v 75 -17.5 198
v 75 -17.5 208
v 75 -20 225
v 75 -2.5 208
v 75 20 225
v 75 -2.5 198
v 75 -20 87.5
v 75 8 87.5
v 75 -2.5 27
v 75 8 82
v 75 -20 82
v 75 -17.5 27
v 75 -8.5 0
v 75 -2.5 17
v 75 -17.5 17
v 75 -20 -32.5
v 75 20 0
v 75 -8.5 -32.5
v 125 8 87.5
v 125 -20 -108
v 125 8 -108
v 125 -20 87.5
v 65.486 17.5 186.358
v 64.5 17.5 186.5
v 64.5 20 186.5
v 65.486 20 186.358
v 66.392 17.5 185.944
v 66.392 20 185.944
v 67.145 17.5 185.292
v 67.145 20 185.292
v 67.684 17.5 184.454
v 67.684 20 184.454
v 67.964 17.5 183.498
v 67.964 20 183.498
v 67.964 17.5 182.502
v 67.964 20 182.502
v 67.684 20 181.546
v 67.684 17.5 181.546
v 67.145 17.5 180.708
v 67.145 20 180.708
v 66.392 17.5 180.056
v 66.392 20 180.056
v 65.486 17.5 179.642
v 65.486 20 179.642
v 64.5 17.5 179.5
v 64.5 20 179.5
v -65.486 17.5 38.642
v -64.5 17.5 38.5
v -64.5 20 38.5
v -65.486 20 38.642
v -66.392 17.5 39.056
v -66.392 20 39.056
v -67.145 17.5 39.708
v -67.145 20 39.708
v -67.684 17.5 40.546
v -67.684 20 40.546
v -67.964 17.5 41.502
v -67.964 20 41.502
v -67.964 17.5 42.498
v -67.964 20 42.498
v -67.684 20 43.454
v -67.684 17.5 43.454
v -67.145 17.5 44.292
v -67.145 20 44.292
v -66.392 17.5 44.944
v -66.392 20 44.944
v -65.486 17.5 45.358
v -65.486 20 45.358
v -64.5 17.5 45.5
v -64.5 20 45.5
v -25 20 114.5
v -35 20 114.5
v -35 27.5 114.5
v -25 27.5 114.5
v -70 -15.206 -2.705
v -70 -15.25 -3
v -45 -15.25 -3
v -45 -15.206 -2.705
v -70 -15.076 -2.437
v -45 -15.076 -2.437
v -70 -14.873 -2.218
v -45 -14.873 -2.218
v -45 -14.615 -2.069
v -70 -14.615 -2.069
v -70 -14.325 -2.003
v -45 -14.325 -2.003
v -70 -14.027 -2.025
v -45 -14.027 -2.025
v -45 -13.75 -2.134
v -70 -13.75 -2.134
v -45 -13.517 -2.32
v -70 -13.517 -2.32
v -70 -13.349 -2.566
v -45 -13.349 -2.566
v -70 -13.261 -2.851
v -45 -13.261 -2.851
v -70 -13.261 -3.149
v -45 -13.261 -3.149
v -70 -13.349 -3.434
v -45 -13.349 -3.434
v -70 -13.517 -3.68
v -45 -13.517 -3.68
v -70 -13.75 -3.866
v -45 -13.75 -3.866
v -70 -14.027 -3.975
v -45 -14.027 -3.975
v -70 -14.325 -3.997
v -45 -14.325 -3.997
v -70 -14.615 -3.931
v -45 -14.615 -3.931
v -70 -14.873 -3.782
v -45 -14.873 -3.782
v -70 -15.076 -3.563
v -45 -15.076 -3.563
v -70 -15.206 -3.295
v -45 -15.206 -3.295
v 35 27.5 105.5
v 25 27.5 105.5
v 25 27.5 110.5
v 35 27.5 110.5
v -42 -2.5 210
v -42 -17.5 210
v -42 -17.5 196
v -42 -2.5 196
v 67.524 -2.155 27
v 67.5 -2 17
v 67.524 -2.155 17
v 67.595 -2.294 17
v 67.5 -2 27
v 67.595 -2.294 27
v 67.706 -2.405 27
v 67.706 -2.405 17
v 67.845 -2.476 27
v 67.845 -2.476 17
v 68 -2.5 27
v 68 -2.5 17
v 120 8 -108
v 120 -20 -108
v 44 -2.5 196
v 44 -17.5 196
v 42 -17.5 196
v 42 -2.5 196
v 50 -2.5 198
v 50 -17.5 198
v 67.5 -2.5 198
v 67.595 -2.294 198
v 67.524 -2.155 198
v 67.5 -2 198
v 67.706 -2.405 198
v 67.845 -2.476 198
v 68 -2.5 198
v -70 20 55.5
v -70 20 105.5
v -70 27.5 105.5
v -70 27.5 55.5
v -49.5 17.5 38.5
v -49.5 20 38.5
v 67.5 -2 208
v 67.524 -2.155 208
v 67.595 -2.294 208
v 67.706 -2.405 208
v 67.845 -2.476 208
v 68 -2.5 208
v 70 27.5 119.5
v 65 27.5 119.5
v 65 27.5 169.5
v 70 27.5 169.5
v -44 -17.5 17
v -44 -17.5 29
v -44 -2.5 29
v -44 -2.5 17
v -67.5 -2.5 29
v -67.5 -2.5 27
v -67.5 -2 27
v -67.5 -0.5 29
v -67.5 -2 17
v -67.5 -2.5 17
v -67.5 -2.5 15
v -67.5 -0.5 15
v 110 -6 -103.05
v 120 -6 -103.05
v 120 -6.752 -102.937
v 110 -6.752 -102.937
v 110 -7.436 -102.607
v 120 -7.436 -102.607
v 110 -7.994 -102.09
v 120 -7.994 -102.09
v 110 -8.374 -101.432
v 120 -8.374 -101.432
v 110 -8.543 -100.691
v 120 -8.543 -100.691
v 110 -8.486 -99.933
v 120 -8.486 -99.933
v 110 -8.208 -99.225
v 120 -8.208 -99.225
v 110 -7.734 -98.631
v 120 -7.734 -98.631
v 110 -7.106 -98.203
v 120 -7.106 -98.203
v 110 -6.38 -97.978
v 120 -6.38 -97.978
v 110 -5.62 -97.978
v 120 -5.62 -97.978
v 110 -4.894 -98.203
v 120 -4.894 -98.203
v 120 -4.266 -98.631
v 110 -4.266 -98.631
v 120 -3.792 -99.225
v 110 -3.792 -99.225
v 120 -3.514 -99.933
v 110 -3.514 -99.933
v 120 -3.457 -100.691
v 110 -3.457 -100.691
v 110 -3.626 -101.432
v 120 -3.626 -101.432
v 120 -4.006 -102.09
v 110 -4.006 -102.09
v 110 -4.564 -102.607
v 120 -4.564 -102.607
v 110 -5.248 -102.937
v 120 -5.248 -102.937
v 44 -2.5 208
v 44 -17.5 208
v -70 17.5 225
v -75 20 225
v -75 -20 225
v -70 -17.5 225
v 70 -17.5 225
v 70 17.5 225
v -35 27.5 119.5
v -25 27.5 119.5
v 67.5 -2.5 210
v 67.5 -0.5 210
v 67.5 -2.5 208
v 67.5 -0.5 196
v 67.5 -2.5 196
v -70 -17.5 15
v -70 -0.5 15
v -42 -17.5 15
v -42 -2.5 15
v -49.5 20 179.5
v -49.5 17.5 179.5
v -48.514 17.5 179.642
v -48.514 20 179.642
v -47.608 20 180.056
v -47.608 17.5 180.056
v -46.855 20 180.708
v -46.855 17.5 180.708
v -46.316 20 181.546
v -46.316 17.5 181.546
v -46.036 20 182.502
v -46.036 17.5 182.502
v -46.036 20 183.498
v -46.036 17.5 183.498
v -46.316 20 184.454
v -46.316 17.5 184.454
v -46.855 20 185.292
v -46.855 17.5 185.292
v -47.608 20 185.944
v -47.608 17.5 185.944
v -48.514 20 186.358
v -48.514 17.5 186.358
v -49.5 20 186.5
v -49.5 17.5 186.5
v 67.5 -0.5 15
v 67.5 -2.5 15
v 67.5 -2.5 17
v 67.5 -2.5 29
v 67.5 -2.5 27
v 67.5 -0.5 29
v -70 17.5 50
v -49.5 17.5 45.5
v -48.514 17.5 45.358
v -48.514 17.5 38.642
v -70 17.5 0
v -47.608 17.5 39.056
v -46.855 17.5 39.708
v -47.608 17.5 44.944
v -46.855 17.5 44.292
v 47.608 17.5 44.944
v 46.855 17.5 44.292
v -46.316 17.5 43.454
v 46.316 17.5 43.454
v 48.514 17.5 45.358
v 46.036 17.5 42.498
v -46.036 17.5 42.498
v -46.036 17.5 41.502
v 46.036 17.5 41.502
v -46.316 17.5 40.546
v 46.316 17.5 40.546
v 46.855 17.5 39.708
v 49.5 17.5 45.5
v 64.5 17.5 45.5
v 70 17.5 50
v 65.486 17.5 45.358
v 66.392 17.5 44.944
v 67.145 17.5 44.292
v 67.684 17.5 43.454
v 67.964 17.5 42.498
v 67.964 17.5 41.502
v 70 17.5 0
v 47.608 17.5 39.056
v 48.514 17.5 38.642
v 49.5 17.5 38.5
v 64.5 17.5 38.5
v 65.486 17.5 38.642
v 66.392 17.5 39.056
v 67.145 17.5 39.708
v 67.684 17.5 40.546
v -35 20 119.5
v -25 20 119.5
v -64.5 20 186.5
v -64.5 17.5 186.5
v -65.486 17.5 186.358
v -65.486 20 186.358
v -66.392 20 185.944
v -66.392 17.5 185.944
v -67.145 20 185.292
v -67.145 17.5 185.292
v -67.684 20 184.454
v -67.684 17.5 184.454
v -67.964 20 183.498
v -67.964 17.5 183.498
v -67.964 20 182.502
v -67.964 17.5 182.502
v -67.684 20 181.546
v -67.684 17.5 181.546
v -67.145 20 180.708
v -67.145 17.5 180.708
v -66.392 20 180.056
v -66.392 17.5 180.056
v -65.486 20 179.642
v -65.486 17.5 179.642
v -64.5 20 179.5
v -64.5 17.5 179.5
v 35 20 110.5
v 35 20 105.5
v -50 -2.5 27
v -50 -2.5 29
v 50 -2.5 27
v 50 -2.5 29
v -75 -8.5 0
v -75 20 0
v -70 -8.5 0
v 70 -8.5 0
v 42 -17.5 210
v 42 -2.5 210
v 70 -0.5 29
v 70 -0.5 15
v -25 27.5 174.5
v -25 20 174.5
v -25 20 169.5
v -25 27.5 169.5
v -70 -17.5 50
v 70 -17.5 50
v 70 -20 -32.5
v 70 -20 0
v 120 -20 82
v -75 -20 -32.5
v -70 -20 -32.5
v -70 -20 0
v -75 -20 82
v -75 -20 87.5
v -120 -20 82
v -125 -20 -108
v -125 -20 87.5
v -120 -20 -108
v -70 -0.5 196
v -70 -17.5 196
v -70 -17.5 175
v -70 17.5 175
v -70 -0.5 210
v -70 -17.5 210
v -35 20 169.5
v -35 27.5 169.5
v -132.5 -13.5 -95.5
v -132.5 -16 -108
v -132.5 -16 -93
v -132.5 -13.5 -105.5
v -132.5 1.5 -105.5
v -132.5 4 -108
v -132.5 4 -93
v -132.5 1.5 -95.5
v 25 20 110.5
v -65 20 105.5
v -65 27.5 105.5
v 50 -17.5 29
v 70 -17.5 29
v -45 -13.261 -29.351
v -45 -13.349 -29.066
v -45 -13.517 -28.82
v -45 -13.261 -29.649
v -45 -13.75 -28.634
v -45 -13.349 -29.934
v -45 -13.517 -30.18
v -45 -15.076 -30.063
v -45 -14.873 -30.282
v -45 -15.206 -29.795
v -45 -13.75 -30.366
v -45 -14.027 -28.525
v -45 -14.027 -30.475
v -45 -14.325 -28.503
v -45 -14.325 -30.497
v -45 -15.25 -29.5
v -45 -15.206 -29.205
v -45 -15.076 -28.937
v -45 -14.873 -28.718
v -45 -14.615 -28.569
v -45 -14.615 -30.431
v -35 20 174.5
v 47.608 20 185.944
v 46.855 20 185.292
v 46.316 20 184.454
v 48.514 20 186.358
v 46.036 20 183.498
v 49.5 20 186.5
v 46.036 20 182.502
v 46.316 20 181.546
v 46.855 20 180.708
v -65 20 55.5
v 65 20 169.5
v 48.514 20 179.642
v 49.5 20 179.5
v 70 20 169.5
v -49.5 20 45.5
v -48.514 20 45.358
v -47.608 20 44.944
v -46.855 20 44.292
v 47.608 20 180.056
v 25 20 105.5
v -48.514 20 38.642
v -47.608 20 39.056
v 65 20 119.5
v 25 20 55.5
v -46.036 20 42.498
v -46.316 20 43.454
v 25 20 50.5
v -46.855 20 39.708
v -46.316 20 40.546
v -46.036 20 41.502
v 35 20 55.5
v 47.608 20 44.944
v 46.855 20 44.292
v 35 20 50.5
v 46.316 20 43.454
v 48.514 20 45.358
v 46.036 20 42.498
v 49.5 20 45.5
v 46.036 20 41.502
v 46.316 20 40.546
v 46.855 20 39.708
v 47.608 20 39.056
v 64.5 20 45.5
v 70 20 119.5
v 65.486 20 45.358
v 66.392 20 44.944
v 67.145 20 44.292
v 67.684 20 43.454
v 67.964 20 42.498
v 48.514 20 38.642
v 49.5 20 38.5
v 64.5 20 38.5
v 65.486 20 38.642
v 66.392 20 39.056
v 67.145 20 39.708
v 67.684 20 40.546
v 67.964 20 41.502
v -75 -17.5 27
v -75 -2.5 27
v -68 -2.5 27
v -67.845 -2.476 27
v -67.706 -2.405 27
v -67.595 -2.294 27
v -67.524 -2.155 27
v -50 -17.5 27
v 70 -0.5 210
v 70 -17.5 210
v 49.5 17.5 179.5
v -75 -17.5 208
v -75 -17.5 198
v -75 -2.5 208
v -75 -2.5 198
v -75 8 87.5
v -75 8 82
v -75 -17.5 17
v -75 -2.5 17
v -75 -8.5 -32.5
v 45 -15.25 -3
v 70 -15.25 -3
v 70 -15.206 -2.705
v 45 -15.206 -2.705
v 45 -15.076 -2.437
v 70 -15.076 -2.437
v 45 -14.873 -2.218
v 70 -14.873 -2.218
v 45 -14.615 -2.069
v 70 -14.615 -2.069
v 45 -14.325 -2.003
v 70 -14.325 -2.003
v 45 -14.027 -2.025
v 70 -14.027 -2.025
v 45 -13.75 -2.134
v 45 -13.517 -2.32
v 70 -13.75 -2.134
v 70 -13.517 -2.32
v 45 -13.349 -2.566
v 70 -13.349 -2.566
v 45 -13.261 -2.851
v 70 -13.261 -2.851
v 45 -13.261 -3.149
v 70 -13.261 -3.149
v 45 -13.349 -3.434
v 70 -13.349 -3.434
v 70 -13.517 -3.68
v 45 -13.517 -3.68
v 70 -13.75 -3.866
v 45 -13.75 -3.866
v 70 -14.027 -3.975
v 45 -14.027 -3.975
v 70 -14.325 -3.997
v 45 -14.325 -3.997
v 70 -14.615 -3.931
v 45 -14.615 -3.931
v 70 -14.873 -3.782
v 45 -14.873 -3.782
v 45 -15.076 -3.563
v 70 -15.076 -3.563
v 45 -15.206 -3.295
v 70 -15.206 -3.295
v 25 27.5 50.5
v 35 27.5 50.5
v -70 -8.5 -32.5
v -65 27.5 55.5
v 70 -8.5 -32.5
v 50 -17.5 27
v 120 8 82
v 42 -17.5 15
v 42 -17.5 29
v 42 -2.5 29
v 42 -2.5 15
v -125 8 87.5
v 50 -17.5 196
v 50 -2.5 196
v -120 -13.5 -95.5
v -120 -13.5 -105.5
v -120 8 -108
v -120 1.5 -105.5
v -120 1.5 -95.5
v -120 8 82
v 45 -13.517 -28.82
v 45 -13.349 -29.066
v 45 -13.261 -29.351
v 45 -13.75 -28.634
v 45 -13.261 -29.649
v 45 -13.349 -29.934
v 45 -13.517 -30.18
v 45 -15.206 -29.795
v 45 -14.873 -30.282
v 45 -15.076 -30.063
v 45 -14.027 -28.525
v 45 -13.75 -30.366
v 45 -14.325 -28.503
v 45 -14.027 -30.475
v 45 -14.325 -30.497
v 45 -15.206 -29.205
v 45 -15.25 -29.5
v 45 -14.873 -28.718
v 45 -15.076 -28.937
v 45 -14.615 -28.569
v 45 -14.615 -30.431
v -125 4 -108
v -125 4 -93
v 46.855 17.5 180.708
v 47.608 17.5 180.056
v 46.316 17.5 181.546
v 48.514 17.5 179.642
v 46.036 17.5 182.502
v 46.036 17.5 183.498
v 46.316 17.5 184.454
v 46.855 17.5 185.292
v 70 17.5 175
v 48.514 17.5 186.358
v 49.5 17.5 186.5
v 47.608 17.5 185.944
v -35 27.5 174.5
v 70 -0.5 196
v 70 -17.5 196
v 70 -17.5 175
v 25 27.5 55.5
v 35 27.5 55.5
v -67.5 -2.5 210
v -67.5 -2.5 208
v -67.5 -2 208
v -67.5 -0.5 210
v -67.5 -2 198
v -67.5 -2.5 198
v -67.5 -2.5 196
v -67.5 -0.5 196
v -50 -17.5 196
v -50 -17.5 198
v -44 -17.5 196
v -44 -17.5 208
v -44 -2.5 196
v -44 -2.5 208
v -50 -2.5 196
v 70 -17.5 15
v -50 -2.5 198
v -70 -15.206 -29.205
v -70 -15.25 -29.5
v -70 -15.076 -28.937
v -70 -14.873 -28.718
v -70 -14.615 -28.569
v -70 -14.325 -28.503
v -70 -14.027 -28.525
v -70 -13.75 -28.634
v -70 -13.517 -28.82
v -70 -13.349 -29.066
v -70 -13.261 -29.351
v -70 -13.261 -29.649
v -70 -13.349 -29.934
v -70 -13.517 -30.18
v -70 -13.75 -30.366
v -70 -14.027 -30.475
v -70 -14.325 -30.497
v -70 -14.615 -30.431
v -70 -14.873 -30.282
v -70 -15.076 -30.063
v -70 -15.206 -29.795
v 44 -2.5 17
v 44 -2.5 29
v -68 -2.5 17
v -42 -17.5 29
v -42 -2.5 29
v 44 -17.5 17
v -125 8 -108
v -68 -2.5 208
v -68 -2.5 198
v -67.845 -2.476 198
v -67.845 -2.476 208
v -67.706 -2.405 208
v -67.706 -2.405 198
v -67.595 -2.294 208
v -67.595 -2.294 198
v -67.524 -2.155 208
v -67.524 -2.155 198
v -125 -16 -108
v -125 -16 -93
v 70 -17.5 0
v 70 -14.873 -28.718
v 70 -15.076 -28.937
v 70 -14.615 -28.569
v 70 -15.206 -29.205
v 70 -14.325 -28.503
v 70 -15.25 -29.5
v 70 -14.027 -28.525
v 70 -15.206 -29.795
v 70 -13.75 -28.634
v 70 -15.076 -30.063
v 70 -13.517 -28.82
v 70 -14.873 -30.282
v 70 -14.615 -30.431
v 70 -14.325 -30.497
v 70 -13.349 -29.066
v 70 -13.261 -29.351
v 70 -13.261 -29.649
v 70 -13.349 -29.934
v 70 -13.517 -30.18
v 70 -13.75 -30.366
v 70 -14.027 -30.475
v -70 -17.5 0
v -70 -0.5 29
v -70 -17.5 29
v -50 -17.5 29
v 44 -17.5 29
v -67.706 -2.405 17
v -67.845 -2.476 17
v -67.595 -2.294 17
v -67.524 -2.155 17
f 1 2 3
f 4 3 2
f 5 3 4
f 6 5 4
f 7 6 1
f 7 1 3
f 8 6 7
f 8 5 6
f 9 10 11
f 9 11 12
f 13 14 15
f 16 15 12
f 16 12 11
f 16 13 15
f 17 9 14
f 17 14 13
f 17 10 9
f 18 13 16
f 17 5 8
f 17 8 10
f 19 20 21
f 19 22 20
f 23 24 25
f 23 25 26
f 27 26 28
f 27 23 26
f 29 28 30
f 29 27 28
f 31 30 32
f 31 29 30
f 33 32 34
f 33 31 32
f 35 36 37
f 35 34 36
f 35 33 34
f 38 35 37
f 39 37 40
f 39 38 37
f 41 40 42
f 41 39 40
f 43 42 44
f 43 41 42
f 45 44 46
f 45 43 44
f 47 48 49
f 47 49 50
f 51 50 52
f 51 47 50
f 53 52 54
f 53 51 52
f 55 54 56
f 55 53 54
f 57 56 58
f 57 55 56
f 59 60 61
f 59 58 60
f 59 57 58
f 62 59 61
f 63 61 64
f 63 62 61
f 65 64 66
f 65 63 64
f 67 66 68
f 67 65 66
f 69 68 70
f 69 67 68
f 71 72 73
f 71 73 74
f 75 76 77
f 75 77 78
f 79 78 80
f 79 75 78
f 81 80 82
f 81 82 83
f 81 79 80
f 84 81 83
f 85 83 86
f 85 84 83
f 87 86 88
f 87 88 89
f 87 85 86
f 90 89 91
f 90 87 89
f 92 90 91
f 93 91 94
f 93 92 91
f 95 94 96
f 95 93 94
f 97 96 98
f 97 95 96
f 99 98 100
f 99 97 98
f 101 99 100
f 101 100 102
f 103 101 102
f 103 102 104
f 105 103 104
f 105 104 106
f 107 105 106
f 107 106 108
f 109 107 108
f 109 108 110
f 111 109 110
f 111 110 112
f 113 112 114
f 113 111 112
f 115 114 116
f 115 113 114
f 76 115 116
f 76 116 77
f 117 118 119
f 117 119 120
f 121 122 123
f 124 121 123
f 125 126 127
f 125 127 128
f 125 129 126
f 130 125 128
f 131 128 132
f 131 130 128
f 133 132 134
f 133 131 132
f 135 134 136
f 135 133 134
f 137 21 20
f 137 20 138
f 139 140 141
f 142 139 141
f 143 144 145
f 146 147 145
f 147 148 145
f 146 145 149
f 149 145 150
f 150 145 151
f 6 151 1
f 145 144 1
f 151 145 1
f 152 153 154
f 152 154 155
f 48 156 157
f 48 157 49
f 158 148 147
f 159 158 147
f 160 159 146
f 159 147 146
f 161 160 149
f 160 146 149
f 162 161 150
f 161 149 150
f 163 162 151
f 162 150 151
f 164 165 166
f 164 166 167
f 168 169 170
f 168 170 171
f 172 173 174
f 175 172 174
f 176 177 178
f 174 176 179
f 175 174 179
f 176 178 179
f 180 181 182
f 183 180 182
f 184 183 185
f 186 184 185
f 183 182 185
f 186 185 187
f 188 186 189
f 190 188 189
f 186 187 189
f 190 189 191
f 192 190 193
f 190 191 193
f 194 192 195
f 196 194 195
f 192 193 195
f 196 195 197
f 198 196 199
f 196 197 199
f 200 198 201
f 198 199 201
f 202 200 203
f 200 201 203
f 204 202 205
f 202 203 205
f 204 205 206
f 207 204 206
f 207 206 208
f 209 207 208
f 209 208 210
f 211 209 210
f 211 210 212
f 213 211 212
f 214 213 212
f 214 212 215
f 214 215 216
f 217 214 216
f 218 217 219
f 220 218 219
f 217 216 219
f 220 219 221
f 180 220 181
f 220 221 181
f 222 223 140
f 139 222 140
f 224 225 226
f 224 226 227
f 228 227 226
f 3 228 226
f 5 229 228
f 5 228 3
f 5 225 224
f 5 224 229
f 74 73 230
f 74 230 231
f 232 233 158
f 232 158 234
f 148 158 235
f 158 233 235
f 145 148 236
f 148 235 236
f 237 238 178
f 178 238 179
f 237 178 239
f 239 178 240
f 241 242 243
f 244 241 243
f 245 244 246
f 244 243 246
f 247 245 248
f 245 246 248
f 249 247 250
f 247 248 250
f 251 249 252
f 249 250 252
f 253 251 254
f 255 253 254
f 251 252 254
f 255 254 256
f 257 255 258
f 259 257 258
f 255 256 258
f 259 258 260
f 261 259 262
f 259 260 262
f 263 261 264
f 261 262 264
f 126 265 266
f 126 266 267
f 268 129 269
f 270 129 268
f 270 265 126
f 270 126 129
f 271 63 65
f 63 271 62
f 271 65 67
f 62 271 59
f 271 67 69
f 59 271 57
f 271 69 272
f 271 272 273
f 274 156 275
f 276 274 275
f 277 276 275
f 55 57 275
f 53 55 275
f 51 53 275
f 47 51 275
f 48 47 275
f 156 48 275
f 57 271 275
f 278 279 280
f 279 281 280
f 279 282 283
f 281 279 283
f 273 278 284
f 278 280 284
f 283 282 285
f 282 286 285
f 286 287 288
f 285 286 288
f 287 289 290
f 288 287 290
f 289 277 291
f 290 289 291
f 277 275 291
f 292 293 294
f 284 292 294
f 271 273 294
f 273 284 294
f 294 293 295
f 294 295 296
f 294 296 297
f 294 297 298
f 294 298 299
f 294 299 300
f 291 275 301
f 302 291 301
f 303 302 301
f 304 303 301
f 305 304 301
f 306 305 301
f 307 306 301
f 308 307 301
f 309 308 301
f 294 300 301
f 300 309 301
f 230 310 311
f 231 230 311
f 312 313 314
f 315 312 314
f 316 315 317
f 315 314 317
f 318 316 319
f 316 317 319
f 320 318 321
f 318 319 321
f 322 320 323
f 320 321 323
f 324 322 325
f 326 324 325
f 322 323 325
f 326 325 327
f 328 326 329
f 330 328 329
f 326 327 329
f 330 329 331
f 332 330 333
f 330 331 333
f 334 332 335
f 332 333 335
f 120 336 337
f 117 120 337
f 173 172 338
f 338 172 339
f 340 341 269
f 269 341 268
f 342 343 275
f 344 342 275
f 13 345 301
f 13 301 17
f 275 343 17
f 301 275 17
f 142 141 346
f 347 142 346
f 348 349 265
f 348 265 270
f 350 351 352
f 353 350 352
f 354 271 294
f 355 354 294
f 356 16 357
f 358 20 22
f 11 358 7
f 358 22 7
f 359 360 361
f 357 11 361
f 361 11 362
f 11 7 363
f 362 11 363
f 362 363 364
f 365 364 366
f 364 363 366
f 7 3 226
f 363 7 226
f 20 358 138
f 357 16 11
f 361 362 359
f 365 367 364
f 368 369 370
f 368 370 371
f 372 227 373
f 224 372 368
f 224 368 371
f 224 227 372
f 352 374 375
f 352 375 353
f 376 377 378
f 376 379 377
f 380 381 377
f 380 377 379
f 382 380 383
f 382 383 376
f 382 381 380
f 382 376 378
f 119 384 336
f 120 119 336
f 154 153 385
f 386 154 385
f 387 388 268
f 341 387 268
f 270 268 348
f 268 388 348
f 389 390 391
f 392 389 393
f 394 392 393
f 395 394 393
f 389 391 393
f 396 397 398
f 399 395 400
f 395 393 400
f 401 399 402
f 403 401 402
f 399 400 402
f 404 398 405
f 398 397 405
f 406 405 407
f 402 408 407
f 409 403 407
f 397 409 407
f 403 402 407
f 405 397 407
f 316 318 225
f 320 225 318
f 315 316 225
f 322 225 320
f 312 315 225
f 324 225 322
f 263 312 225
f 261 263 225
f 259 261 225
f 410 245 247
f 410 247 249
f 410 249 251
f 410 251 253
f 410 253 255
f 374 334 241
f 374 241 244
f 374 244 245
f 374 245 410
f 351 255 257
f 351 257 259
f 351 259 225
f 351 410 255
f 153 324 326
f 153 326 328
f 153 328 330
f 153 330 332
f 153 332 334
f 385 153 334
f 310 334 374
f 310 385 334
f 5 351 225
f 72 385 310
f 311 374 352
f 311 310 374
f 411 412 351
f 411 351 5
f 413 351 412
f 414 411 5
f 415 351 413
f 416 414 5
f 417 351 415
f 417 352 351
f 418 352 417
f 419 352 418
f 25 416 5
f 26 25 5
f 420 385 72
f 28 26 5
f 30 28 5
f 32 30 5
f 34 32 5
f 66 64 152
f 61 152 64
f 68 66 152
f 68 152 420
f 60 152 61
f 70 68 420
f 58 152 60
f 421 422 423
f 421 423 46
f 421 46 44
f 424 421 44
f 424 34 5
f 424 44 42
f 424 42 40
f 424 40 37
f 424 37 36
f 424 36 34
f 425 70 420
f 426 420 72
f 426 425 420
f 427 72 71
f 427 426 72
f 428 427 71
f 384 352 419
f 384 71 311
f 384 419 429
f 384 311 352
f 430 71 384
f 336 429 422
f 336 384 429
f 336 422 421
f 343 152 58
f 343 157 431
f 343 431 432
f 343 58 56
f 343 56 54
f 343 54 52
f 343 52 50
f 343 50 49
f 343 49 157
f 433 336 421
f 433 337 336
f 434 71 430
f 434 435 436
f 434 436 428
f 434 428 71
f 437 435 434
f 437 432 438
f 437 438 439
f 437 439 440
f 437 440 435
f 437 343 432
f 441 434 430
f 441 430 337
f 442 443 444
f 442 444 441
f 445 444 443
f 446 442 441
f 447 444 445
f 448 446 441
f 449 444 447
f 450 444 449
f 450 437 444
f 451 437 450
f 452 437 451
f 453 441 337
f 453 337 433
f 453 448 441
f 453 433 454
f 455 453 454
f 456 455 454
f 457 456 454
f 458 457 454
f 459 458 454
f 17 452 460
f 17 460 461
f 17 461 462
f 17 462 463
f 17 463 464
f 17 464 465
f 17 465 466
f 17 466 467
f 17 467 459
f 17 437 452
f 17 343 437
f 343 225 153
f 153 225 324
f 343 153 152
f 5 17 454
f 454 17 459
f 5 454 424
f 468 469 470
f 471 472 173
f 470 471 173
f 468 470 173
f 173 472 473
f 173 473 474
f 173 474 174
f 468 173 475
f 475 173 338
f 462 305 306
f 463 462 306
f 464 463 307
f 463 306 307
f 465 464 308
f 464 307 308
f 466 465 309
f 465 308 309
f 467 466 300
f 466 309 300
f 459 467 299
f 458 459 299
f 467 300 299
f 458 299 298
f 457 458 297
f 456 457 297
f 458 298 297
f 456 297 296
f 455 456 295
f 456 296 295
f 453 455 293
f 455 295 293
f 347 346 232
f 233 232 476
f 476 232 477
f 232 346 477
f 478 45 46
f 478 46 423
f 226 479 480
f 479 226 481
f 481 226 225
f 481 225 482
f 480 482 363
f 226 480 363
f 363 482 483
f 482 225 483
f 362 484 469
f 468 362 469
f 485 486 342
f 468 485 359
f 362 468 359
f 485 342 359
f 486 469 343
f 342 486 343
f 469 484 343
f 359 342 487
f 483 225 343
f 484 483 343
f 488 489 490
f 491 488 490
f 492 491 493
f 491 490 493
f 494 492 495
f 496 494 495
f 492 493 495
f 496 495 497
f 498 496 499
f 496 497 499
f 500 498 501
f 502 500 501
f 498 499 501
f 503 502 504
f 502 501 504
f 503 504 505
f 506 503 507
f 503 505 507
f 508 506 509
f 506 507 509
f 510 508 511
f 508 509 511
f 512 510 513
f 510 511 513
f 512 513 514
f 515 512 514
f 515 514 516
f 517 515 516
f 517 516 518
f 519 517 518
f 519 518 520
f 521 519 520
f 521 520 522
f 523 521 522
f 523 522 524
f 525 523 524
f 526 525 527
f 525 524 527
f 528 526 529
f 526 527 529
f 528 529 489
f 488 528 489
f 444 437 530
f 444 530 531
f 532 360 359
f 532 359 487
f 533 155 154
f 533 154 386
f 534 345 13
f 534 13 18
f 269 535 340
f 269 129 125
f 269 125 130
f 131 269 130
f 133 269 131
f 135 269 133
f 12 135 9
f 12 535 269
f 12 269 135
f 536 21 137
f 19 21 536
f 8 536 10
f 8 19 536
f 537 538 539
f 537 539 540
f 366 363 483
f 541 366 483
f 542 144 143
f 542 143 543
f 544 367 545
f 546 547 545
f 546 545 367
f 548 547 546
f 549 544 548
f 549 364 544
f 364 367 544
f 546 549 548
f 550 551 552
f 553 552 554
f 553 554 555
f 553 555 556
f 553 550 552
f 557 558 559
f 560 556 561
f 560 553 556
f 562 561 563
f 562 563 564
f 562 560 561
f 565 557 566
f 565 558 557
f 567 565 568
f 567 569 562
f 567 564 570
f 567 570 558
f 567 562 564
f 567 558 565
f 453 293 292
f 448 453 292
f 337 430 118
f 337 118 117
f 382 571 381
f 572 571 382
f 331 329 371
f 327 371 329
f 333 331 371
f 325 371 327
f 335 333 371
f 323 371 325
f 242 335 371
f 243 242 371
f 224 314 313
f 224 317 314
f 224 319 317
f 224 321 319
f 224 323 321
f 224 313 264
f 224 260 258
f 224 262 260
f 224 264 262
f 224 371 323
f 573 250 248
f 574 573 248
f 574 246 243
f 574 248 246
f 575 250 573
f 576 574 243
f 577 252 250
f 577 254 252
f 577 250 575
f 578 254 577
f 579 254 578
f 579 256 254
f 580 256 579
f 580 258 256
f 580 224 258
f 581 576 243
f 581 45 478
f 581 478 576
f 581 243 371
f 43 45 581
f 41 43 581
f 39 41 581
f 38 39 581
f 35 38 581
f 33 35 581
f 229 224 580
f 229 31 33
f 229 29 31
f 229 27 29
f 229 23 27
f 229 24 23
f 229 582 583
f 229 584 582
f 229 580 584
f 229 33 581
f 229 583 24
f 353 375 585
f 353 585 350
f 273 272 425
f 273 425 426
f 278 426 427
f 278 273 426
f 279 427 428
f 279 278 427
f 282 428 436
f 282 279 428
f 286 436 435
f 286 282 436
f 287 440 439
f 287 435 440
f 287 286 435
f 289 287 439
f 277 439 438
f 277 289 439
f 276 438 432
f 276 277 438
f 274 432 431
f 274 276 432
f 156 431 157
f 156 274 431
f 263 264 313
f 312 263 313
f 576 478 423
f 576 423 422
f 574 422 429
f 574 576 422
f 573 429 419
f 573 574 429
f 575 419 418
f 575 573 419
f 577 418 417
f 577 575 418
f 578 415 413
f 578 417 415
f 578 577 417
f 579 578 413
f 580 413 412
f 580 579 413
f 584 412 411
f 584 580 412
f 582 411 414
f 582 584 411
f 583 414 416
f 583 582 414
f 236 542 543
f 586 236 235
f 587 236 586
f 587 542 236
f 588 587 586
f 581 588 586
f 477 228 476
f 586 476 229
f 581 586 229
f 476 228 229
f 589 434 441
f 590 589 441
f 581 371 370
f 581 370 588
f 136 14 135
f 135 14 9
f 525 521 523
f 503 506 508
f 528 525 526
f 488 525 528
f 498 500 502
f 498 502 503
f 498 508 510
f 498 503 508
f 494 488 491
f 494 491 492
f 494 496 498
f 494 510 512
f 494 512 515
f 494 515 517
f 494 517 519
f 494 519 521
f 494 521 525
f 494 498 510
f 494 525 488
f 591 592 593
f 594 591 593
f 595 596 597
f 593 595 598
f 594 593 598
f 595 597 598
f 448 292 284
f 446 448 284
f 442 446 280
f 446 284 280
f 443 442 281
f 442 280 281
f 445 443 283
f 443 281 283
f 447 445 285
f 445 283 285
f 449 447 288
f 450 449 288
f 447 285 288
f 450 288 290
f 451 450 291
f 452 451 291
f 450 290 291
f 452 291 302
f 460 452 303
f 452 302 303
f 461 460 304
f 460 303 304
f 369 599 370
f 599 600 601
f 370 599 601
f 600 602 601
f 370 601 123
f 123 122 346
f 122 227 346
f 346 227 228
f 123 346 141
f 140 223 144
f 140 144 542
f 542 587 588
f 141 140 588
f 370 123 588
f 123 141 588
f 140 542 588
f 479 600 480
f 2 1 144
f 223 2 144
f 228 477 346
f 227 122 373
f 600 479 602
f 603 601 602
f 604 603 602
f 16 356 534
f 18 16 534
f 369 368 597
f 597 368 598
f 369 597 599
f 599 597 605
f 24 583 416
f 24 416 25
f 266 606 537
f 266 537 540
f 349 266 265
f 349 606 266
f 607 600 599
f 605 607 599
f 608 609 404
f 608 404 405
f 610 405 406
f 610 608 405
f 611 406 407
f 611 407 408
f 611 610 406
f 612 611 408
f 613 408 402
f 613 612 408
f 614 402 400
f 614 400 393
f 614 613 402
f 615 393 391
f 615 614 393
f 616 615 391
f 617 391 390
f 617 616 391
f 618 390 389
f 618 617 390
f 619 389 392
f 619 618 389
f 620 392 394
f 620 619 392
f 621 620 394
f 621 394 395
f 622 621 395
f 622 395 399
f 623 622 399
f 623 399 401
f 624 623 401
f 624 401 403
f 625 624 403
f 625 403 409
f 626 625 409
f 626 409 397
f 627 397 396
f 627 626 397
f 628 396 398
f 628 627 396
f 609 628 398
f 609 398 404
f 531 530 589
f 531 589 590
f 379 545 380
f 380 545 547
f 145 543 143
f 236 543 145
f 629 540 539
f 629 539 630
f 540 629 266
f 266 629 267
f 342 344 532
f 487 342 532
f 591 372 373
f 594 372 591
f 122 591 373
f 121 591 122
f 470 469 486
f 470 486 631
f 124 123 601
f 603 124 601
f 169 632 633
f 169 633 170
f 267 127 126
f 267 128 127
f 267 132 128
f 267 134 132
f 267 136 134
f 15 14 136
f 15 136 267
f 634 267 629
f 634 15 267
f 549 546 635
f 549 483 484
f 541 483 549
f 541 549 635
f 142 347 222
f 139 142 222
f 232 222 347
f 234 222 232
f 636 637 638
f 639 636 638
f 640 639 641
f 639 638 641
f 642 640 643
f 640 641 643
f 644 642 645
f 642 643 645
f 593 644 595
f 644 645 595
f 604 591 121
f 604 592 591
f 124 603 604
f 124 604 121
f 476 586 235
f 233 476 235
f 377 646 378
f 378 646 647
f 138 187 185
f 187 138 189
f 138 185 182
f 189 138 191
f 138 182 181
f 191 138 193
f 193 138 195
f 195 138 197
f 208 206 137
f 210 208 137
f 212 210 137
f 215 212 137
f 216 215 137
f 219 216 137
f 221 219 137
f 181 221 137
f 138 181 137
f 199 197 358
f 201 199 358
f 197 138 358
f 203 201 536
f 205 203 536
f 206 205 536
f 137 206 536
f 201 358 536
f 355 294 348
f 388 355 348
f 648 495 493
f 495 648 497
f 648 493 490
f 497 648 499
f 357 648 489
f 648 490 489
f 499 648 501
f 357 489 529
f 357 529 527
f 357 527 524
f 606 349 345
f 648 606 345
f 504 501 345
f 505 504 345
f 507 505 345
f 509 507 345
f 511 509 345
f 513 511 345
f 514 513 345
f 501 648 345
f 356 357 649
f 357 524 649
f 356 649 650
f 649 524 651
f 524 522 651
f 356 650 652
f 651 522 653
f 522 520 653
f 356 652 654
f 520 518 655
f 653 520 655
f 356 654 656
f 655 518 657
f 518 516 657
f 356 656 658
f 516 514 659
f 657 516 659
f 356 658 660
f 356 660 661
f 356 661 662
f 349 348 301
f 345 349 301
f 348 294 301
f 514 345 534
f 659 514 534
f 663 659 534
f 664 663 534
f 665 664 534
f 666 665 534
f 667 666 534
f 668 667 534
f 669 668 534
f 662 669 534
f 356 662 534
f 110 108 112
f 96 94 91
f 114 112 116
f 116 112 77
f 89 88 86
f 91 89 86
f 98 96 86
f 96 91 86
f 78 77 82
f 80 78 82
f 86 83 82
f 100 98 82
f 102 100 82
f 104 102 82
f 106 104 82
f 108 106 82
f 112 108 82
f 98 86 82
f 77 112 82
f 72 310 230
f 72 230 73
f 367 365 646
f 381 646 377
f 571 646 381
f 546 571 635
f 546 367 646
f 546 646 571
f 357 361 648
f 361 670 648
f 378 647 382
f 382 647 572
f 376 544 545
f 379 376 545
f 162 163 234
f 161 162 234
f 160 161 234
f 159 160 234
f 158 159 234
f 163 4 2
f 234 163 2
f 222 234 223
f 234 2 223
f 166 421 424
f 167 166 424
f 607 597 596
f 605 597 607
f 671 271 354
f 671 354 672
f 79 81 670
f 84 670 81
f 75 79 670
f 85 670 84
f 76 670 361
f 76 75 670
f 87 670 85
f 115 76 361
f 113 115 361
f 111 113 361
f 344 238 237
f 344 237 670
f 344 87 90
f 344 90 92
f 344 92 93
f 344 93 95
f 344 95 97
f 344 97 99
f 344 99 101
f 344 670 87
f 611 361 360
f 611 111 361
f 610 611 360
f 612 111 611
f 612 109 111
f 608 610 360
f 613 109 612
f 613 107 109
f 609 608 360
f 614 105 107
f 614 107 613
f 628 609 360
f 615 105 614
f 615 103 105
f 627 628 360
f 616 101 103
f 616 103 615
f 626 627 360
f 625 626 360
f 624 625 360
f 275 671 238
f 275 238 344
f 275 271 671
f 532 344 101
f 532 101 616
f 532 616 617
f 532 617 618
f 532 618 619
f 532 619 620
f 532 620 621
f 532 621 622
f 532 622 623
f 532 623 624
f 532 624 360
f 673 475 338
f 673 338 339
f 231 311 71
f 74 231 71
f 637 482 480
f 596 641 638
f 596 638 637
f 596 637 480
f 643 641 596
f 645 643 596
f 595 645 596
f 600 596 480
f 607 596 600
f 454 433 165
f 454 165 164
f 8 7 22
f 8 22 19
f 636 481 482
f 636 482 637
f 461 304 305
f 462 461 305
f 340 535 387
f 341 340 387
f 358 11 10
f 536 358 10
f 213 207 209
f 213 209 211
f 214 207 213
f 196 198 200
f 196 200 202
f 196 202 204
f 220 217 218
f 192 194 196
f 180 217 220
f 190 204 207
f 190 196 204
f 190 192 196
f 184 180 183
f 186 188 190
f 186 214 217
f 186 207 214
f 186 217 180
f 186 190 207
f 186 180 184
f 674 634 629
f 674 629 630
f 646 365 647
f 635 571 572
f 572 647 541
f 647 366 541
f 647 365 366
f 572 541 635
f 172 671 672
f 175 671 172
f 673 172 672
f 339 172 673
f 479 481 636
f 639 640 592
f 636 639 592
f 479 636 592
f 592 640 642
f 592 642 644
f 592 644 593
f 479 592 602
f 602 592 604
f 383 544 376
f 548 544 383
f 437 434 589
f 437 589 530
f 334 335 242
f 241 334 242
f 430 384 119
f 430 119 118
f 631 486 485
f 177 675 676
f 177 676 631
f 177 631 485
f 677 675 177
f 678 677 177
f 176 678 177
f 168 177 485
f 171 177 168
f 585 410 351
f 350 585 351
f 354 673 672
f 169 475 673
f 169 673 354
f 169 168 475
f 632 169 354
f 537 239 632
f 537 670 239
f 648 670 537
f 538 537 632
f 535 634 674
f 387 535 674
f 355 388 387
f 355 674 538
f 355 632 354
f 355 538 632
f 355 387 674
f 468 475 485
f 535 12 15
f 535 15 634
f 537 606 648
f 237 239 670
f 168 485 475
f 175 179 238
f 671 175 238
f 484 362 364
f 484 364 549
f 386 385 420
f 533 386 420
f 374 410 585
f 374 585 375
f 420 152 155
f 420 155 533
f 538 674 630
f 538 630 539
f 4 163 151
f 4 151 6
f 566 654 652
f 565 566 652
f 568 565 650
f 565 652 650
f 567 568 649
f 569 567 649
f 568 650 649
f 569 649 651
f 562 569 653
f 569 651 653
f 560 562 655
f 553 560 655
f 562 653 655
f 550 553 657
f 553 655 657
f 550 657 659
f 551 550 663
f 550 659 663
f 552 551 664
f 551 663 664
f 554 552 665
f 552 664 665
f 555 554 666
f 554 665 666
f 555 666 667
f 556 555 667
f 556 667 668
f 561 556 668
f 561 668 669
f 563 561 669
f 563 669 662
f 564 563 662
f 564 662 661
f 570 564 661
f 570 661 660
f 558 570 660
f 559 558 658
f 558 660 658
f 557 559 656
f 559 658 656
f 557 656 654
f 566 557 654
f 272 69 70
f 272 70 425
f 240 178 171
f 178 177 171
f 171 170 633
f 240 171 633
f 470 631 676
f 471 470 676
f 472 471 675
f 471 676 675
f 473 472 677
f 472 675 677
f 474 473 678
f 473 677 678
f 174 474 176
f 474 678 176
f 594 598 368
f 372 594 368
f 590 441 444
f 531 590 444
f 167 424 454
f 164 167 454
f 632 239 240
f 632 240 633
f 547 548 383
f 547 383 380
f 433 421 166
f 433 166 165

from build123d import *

# Parameters (mm, degrees)
SKETCH2_W            = 150
SKETCH2_H            = 40
BOSS_EXTRUDE1_DEPTH  = 225
SKETCH3_W            = 140
SKETCH3_H            = 35
CUT_EXTRUDE1_DEPTH   = 50
SKETCH4_W            = 26
SKETCH4_H            = 2
SKETCH4_W_2          = 20
BOSS_EXTRUDE2_DEPTH  = 15
SKETCH6_W            = 10
SKETCH6_H            = 15
CUT_EXTRUDE2_DEPTH   = 15
CUT_EXTRUDE3_DEPTH   = 67
SKETCH9_W            = 10
SKETCH9_H            = 15
CUT_EXTRUDE4_DEPTH   = 67
SKETCH12_W           = 14
SKETCH12_H           = 2
BOSS_EXTRUDE3_DEPTH  = 2.5
FILLET1_R            = 0.5
MIRROR3_START        = 196
MIRROR3_DEPTH        = 14
MIRROR3_START_2      = 15
MIRROR3_2_DEPTH      = 14
MIRROR3_3_DEPTH      = 2
MIRROR3_START_3      = 208
MIRROR3_4_DEPTH      = 2
MIRROR3_5_DEPTH      = 2
MIRROR3_START_4      = 27
MIRROR3_6_DEPTH      = 2
SKETCH16_W           = 32.5
SKETCH16_H           = 11.5
BOSS_EXTRUDE5_DEPTH  = 5
SKETCH17_R           = 1
BOSS_EXTRUDE7_DEPTH  = 25
SKETCH18_W           = 5
SKETCH18_H           = 50
SKETCH18_W_2         = 10
SKETCH18_H_2         = 5
BOSS_EXTRUDE8_DEPTH  = 7.5
SKETCH24_W           = 5.5
SKETCH24_H           = 28
BOSS_EXTRUDE11_DEPTH = 50
SKETCH25_W           = 5
SKETCH25_H           = 28
BOSS_EXTRUDE12_DEPTH = 190
SKETCH26_W           = 5
SKETCH26_H           = 28
BOSS_EXTRUDE13_DEPTH = 190
SKETCH27_R           = 2.55
BOSS_EXTRUDE14_DEPTH = 10
SKETCH29_W           = 10
SKETCH29_H           = 15
CUT_EXTRUDE5_DEPTH   = 19
SKETCH30_W           = 15
SKETCH30_H           = 20
BOSS_EXTRUDE15_DEPTH = 7.5
SKETCH32_W           = 10
SKETCH32_H           = 15
CUT_EXTRUDE6_DEPTH   = 19


# Read off the part's stored shape, not the designer's step: Mirror3
with BuildPart() as part:
    # Sketch2 → Boss-Extrude1 (new body)
    with BuildSketch(Plane.XY):
        Rectangle(SKETCH2_W, SKETCH2_H)
    extrude(amount=BOSS_EXTRUDE1_DEPTH)

    # Sketch3 → Cut-Extrude1 (cut)
    with BuildSketch(Plane.XY.offset(225)):
        Rectangle(SKETCH3_W, SKETCH3_H)
    cut_extrude1 = extrude(amount=-CUT_EXTRUDE1_DEPTH, mode=Mode.SUBTRACT)

    # Sketch4 → Boss-Extrude2 (add)
    with BuildSketch(Plane(origin=(0, -17.5, 0), x_dir=(1, 0, 0), z_dir=(0, 1, 0))):
        Polygon((-42, -196), (-44, -196), (-44, -208), (-44, -210), (-42, -210), align=None)
        with Locations((-57, -209)):
            Rectangle(SKETCH4_W, SKETCH4_H)
        with Locations((-60, -197)):
            Rectangle(SKETCH4_W_2, SKETCH4_H)
        Polygon((70, -210), (70, -208), (44, -208), (44, -196), (42, -196), (42, -210), (44, -210), align=None)
        with Locations((60, -197)):
            Rectangle(SKETCH4_W_2, SKETCH4_H)
    boss_extrude2 = extrude(amount=BOSS_EXTRUDE2_DEPTH)

    # Sketch6 → Cut-Extrude2 (cut)
    with BuildSketch(Plane(origin=(-70, 0, 0), x_dir=(0, 0, -1), z_dir=(1, 0, 0))):
        with Locations((-203, -10)):
            Rectangle(SKETCH6_W, SKETCH6_H)
    cut_extrude2 = extrude(amount=-CUT_EXTRUDE2_DEPTH, mode=Mode.SUBTRACT)

    # Sketch8 → Cut-Extrude3 (cut)
    with BuildSketch(Plane(origin=(0, -17.5, 0), x_dir=(1, 0, 0), z_dir=(0, 1, 0))):
        with BuildLine():
            Line((-64.5, -179.5), (-49.5, -179.5))
            ThreePointArc((-49.5, -179.5), (-46, -183), (-49.5, -186.5))
            Line((-49.5, -186.5), (-64.5, -186.5))
            ThreePointArc((-64.5, -186.5), (-68, -183), (-64.5, -179.5))
        make_face()
        with BuildLine():
            Line((64.5, -179.5), (49.5, -179.5))
            ThreePointArc((49.5, -179.5), (46, -183), (49.5, -186.5))
            Line((49.5, -186.5), (64.5, -186.5))
            ThreePointArc((64.5, -186.5), (68, -183), (64.5, -179.5))
        make_face()
    cut_extrude3 = extrude(amount=CUT_EXTRUDE3_DEPTH, mode=Mode.SUBTRACT)

    # Sketch9 → Cut-Extrude4 (cut)
    with BuildSketch(Plane.ZY.offset(-70)):
        with Locations((203, -10)):
            Rectangle(SKETCH9_W, SKETCH9_H)
    cut_extrude4 = extrude(amount=-CUT_EXTRUDE4_DEPTH, mode=Mode.SUBTRACT)

    # Mirror1: Cut-Extrude1, Boss-Extrude2, Cut-Extrude2, Cut-Extrude3, Cut-Extrude4 across plane
    add(cut_extrude1.mirror(Plane.XY.offset(112.5)), mode=Mode.SUBTRACT)
    add(boss_extrude2.mirror(Plane.XY.offset(112.5)))
    add(cut_extrude2.mirror(Plane.XY.offset(112.5)), mode=Mode.SUBTRACT)
    add(cut_extrude3.mirror(Plane.XY.offset(112.5)), mode=Mode.SUBTRACT)
    add(cut_extrude4.mirror(Plane.XY.offset(112.5)), mode=Mode.SUBTRACT)

    # Sketch12 → Boss-Extrude3 (add)
    with BuildSketch(Plane.ZY.offset(-70)):
        with Locations((22, -1.5)):
            Rectangle(SKETCH12_W, SKETCH12_H)
    extrude(amount=BOSS_EXTRUDE3_DEPTH)

    # Fillet1
    fillet1_edges = [part.edges().sort_by_distance(p)[0] for p in [
        (67.5, -2.5, 22),
    ]]
    fillet(fillet1_edges, radius=FILLET1_R)

    # Mirror3 outline → Mirror3 (add)
    with BuildSketch(Plane.XY.offset(MIRROR3_START)):
        with BuildLine():
            Line((-70, -2.5), (-68, -2.5))
            ThreePointArc((-68, -2.5), (-67.646446609, -2.353553391), (-67.5, -2))
            Line((-67.5, -2), (-67.5, -0.5))
            Line((-67.5, -0.5), (-70, -0.5))
            Line((-70, -0.5), (-70, -2.5))
        make_face()
        with BuildLine():
            Line((68, -2.5), (70, -2.5))
            Line((70, -2.5), (70, -0.5))
            Line((70, -0.5), (67.5, -0.5))
            Line((67.5, -0.5), (67.5, -2))
            ThreePointArc((67.5, -2), (67.646446609, -2.353553391), (68, -2.5))
        make_face()
    extrude(amount=MIRROR3_DEPTH)

    # Mirror3 2 outline → Mirror3 2 (add)
    with BuildSketch(Plane.XY.offset(MIRROR3_START_2)):
        with BuildLine():
            Line((-70, -2.5), (-68, -2.5))
            ThreePointArc((-68, -2.5), (-67.646446609, -2.353553391), (-67.5, -2))
            Line((-67.5, -2), (-67.5, -0.5))
            Line((-67.5, -0.5), (-70, -0.5))
            Line((-70, -0.5), (-70, -2.5))
        make_face()
    extrude(amount=MIRROR3_2_DEPTH)

    # Mirror3 3 outline → Mirror3 3 (add)
    with BuildSketch(Plane.XY.offset(MIRROR3_START)):
        with BuildLine():
            ThreePointArc((-67.5, -2), (-67.646446609, -2.353553391), (-68, -2.5))
            Line((-68, -2.5), (-67.5, -2.5))
            Line((-67.5, -2.5), (-67.5, -2))
        make_face()
        with BuildLine():
            Line((67.5, -2.5), (68, -2.5))
            ThreePointArc((68, -2.5), (67.646446609, -2.353553391), (67.5, -2))
            Line((67.5, -2), (67.5, -2.5))
        make_face()
    extrude(amount=MIRROR3_3_DEPTH)

    # Mirror3 4 outline → Mirror3 4 (add)
    with BuildSketch(Plane.XY.offset(MIRROR3_START_3)):
        with BuildLine():
            ThreePointArc((-67.5, -2), (-67.646446609, -2.353553391), (-68, -2.5))
            Line((-68, -2.5), (-67.5, -2.5))
            Line((-67.5, -2.5), (-67.5, -2))
        make_face()
        with BuildLine():
            Line((67.5, -2.5), (68, -2.5))
            ThreePointArc((68, -2.5), (67.646446609, -2.353553391), (67.5, -2))
            Line((67.5, -2), (67.5, -2.5))
        make_face()
    extrude(amount=MIRROR3_4_DEPTH)

    # Mirror3 5 outline → Mirror3 5 (add)
    with BuildSketch(Plane.XY.offset(MIRROR3_START_2)):
        with BuildLine():
            ThreePointArc((-67.5, -2), (-67.646446609, -2.353553391), (-68, -2.5))
            Line((-68, -2.5), (-67.5, -2.5))
            Line((-67.5, -2.5), (-67.5, -2))
        make_face()
    extrude(amount=MIRROR3_5_DEPTH)

    # Mirror3 6 outline → Mirror3 6 (add)
    with BuildSketch(Plane.XY.offset(MIRROR3_START_4)):
        with BuildLine():
            ThreePointArc((-67.5, -2), (-67.646446609, -2.353553391), (-68, -2.5))
            Line((-68, -2.5), (-67.5, -2.5))
            Line((-67.5, -2.5), (-67.5, -2))
        make_face()
    extrude(amount=MIRROR3_6_DEPTH)

    # Sketch16 → Boss-Extrude5 (add)
    with BuildSketch(Plane(origin=(-70, 0, 0), x_dir=(0, 0, -1), z_dir=(1, 0, 0))):
        with Locations((16.25, -14.25)):
            Rectangle(SKETCH16_W, SKETCH16_H)
    boss_extrude5 = extrude(amount=-BOSS_EXTRUDE5_DEPTH)

    # Mirror4: Boss-Extrude5 across plane
    add(boss_extrude5.mirror(Plane(origin=(0, 0, 0), x_dir=(0, 0, 1), z_dir=(1, 0, 0))))

    # Sketch17 → Boss-Extrude7 (add)
    with BuildSketch(Plane.ZY.offset(-70)):
        with Locations(Location((-29.5, -14.25, 0), (0, 0, 270))):
            Circle(SKETCH17_R)
        with Locations(Location((-3, -14.25, 0), (0, 0, 270))):
            Circle(SKETCH17_R)
    boss_extrude7 = extrude(amount=BOSS_EXTRUDE7_DEPTH)

    # Mirror5: Boss-Extrude7 across plane
    add(boss_extrude7.mirror(Plane(origin=(0, 0, 0), x_dir=(0, 0, 1), z_dir=(1, 0, 0))))

    # Sketch18 → Boss-Extrude8 (add)
    with BuildSketch(Plane(origin=(0, 20, 0), x_dir=(1, 0, 0), z_dir=(0, 1, 0))):
        with Locations((-67.5, -80.5)):
            Rectangle(SKETCH18_W, SKETCH18_H)
        with Locations((67.5, -144.5)):
            Rectangle(SKETCH18_W, SKETCH18_H)
        with Locations((-30, -172)):
            Rectangle(SKETCH18_W_2, SKETCH18_H_2)
        with Locations((-30, -117)):
            Rectangle(SKETCH18_W_2, SKETCH18_H_2)
        with Locations((30, -108)):
            Rectangle(SKETCH18_W_2, SKETCH18_H_2)
        with Locations((30, -53)):
            Rectangle(SKETCH18_W_2, SKETCH18_H_2)
    extrude(amount=BOSS_EXTRUDE8_DEPTH)

    # Sketch24 → Boss-Extrude11 (add)
    with BuildSketch(Plane.ZY.offset(75)):
        with Locations((84.75, -6)):
            Rectangle(SKETCH24_W, SKETCH24_H)
    boss_extrude11 = extrude(amount=BOSS_EXTRUDE11_DEPTH)

    # Sketch25 → Boss-Extrude12 (add)
    with BuildSketch(Plane(origin=(0, 0, 82), x_dir=(-1, 0, 0), z_dir=(0, 0, -1))):
        with Locations((122.5, -6)):
            Rectangle(SKETCH25_W, SKETCH25_H)
    extrude(amount=BOSS_EXTRUDE12_DEPTH)

    # Mirror12: Boss-Extrude11 across plane
    add(boss_extrude11.mirror(Plane(origin=(0, 0, 0), x_dir=(0, 0, 1), z_dir=(1, 0, 0))))

    # Sketch26 → Boss-Extrude13 (add)
    with BuildSketch(Plane(origin=(0, 0, 82), x_dir=(-1, 0, 0), z_dir=(0, 0, -1))):
        with Locations((-122.5, -6)):
            Rectangle(SKETCH26_W, SKETCH26_H)
    extrude(amount=BOSS_EXTRUDE13_DEPTH)

    # Sketch27 → Boss-Extrude14 (add)
    with BuildSketch(Plane.ZY.offset(-120)):
        with Locations(Location((-100.5, -6, 0), (0, 0, 180))):
            Circle(SKETCH27_R)
    boss_extrude14 = extrude(amount=BOSS_EXTRUDE14_DEPTH)

    # Mirror13: Boss-Extrude14 across plane
    add(boss_extrude14.mirror(Plane(origin=(0, 0, 0), x_dir=(0, 0, 1), z_dir=(1, 0, 0))))

    # Sketch29 → Cut-Extrude5 (cut)
    with BuildSketch(Plane.ZY.offset(125)):
        with Locations((-100.5, -6)):
            Rectangle(SKETCH29_W, SKETCH29_H)
    extrude(amount=-CUT_EXTRUDE5_DEPTH, mode=Mode.SUBTRACT)

    # Sketch30 → Boss-Extrude15 (add)
    with BuildSketch(Plane.ZY.offset(125)):
        with Locations((-100.5, -6)):
            Rectangle(SKETCH30_W, SKETCH30_H)
    extrude(amount=BOSS_EXTRUDE15_DEPTH)

    # Sketch32 → Cut-Extrude6 (cut)
    with BuildSketch(Plane(origin=(-125, 0, 0), x_dir=(0, 0, -1), z_dir=(1, 0, 0))):
        with Locations((100.5, -6)):
            Rectangle(SKETCH32_W, SKETCH32_H)
    extrude(amount=-CUT_EXTRUDE6_DEPTH, mode=Mode.SUBTRACT)


solid = part.part
